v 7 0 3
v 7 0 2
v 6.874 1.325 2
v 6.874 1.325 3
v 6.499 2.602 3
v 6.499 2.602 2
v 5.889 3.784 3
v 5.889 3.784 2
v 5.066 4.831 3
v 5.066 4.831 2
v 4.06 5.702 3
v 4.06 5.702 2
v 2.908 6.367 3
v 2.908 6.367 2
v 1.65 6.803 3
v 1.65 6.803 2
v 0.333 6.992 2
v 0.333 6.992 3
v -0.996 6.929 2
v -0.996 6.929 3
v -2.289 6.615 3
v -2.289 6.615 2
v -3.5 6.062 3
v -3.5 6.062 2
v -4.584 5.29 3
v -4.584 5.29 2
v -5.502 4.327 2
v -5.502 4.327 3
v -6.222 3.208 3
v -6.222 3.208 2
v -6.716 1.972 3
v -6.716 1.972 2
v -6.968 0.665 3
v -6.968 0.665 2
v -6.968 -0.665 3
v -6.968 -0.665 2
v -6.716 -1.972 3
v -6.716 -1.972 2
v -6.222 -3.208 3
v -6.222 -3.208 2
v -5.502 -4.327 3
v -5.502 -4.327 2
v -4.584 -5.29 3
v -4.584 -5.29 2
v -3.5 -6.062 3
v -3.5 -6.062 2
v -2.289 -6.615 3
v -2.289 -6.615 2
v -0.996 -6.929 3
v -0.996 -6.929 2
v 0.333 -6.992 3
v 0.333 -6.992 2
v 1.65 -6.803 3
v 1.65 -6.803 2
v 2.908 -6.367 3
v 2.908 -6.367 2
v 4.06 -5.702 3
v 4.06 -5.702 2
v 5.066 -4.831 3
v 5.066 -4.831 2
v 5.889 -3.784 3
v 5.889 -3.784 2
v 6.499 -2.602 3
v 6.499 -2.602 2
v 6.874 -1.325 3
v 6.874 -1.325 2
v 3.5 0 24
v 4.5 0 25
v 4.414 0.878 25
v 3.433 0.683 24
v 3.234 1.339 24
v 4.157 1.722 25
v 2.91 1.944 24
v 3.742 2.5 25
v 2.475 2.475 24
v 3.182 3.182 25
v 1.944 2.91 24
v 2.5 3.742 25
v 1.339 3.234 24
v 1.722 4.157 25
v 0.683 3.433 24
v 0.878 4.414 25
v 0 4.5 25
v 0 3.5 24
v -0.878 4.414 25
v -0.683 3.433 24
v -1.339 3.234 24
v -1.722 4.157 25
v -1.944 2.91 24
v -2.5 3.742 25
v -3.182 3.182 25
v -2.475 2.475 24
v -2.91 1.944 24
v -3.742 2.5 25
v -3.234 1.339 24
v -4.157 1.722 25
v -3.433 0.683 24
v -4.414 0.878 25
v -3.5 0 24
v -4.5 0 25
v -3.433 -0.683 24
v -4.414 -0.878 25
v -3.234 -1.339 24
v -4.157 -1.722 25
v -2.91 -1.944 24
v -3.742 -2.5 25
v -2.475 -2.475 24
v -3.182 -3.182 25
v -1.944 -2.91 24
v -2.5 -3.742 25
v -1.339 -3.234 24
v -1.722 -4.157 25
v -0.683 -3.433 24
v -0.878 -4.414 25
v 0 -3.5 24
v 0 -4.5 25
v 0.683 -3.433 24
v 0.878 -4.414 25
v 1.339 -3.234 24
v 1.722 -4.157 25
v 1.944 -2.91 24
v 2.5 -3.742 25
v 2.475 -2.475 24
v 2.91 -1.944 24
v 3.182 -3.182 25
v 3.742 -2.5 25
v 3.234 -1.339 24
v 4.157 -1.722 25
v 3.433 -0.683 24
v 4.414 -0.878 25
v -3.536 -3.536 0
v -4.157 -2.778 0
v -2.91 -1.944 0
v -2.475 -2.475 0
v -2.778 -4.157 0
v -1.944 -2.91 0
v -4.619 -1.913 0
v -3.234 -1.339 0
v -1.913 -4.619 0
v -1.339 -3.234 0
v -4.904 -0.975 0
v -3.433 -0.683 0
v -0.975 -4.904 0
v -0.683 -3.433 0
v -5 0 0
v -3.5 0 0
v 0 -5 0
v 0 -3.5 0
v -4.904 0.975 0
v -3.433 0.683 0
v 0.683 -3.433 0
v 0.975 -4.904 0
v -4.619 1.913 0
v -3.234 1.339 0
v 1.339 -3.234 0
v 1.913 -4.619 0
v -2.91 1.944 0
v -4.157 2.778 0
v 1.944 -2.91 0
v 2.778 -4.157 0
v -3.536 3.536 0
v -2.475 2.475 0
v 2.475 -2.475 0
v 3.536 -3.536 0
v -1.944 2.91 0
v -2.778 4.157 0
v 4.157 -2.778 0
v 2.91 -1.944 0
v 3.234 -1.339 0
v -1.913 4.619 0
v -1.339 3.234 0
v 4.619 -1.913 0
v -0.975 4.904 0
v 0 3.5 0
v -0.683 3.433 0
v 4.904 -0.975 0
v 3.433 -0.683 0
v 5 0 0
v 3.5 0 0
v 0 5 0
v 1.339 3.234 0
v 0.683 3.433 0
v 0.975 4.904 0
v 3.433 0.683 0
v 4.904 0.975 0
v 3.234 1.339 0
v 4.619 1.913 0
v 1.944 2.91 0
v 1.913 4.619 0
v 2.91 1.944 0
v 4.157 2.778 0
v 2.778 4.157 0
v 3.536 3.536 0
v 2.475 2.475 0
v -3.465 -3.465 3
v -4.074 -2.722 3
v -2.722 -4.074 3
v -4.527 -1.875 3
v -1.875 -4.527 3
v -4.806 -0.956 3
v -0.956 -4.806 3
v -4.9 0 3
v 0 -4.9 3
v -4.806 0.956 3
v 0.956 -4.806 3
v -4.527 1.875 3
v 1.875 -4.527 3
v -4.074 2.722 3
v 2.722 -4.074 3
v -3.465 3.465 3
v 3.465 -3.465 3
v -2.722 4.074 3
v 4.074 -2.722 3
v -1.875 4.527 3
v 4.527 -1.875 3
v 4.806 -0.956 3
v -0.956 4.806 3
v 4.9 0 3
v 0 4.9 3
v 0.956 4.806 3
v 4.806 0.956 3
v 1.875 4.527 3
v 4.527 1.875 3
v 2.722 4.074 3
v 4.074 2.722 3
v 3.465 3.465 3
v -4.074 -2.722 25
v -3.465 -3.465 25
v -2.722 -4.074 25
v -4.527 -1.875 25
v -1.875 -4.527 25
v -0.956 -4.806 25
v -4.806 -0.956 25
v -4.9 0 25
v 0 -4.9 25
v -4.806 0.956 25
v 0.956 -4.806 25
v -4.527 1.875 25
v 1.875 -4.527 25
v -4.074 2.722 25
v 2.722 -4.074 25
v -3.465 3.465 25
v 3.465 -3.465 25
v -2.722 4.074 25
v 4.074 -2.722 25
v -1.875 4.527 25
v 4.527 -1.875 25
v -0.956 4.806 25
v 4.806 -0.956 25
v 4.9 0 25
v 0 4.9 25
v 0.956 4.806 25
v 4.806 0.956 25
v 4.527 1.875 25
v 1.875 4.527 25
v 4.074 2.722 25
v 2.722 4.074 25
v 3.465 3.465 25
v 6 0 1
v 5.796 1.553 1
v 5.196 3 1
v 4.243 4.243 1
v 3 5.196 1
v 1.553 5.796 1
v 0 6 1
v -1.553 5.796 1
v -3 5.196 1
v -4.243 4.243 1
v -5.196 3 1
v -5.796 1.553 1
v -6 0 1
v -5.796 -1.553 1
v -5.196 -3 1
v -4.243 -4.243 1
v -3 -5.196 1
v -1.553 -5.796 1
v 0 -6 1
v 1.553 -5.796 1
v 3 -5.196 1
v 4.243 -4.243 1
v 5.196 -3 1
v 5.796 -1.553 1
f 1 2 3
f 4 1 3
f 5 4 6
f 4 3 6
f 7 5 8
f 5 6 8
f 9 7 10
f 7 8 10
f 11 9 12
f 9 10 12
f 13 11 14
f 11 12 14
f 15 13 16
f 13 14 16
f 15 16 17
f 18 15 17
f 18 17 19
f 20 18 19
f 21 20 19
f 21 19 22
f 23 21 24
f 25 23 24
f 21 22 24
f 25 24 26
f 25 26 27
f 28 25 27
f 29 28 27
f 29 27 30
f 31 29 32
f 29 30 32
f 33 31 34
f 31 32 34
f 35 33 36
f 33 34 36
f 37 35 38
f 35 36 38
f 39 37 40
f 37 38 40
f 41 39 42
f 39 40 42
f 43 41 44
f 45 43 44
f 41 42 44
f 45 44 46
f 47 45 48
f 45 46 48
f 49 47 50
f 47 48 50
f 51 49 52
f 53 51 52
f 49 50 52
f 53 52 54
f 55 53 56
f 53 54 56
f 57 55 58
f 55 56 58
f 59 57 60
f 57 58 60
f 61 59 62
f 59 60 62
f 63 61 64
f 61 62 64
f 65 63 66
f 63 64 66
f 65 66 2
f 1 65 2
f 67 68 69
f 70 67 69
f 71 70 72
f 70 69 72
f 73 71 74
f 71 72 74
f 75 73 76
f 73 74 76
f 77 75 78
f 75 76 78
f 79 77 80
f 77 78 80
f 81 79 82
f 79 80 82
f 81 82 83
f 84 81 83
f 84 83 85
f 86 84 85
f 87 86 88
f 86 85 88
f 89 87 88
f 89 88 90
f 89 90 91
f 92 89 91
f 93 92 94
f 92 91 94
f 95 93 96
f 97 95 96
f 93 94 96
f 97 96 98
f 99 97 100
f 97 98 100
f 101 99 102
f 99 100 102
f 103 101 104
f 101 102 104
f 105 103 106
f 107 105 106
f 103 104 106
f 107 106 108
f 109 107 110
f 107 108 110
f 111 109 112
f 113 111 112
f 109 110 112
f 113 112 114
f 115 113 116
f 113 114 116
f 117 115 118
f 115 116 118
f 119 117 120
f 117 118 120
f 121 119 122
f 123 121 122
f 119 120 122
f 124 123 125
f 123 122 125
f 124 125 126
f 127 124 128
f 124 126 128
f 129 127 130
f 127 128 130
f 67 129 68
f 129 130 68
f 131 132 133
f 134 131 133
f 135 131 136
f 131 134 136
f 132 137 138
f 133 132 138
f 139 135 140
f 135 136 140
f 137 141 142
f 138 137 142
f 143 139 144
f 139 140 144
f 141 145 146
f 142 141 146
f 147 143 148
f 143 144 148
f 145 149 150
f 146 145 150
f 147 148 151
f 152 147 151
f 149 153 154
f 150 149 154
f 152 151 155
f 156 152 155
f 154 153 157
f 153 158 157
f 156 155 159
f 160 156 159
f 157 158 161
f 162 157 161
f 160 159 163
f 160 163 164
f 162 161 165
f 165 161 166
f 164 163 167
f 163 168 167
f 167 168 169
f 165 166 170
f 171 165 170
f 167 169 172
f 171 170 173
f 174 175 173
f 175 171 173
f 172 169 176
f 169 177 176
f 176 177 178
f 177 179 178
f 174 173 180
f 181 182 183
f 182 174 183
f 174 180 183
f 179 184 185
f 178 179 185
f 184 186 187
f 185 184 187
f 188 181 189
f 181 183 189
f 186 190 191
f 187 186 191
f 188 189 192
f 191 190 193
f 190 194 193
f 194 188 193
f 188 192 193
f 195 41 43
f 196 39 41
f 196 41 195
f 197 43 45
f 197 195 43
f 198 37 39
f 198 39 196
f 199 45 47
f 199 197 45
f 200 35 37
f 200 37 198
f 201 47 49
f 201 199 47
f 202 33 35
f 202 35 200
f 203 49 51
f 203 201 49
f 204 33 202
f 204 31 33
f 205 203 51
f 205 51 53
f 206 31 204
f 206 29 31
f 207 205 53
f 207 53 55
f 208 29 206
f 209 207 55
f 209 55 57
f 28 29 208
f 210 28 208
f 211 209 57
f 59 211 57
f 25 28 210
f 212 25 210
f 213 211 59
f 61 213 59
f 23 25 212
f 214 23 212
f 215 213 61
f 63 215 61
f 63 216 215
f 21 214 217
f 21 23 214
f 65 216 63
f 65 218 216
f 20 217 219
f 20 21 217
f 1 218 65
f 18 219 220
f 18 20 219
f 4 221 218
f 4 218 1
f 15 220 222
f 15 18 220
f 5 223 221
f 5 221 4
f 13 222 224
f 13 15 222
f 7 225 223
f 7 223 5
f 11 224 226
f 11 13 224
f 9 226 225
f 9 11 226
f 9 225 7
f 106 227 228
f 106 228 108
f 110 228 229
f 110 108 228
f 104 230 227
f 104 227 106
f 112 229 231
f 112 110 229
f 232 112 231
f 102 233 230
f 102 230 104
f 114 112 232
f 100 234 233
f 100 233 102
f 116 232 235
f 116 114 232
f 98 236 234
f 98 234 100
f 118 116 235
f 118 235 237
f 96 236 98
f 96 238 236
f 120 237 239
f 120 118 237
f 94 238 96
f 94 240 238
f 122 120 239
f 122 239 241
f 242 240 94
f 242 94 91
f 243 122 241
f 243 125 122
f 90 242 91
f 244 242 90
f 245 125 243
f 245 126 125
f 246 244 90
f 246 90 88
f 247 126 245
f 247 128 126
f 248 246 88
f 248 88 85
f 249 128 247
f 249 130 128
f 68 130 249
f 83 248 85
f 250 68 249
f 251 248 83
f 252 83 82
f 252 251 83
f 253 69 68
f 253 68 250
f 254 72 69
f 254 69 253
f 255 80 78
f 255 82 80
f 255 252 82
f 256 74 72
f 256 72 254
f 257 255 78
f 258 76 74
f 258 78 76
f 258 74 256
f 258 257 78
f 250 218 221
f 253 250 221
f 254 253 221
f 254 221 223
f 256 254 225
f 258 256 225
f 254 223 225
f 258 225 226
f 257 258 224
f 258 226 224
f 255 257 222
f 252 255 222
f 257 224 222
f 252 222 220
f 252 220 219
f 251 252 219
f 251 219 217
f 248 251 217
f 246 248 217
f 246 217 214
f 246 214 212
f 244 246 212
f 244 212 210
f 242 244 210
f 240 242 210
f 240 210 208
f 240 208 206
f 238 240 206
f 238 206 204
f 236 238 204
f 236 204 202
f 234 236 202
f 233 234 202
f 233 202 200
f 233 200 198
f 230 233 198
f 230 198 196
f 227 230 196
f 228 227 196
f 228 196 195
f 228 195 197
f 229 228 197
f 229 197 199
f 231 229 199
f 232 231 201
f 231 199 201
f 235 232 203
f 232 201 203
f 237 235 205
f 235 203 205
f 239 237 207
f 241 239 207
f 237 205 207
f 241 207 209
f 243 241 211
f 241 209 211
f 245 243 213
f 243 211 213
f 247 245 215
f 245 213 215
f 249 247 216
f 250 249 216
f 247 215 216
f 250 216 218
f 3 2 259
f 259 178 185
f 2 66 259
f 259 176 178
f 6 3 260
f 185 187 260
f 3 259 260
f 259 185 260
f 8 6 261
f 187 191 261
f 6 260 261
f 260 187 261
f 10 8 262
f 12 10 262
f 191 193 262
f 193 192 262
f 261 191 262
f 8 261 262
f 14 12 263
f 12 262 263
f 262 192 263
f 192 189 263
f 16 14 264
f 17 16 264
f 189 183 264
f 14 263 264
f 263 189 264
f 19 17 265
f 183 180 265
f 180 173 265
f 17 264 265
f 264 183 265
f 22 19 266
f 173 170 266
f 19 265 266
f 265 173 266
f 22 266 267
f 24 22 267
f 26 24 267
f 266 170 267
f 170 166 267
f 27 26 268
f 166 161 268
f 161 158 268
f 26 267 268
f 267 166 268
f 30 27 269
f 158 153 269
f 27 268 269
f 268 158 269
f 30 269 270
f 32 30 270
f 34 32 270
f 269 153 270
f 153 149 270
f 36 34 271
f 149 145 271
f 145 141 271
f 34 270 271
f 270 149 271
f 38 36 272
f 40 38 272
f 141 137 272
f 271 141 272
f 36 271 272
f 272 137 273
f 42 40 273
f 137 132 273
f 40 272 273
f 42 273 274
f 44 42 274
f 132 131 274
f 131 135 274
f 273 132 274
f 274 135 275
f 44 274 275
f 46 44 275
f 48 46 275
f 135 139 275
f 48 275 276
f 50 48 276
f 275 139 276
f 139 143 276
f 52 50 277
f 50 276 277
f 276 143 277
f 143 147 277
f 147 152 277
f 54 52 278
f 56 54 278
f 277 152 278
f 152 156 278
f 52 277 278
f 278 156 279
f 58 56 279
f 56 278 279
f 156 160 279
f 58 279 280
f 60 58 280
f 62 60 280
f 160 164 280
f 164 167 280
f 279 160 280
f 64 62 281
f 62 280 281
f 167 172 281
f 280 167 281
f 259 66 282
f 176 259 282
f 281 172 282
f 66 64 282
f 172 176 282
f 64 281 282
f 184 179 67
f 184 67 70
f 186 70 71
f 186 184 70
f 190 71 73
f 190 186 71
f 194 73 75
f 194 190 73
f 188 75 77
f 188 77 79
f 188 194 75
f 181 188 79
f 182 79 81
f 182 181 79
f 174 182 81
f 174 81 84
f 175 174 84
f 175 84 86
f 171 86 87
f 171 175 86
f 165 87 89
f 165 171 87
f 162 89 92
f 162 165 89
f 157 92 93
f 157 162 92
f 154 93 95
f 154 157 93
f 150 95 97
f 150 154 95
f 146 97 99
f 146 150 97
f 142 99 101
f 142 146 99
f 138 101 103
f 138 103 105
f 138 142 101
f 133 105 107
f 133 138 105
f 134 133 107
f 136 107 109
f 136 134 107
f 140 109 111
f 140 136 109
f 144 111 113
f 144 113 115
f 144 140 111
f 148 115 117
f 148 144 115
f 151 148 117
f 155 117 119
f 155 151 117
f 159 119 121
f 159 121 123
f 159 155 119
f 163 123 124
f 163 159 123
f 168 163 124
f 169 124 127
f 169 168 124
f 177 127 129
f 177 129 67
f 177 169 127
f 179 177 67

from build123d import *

# Parameters (mm, degrees)
F0_R     = 4.9
F0_R_2   = 3.5
F1_DEPTH = 25
F0_R_3   = 7
F2_DEPTH = 3
F3_SIZE  = 2
F4_SIZE  = 1


with BuildPart() as f1:
    # F0 (on Top) → F1 (new body)
    with BuildSketch(Plane.XY):
        Circle(F0_R)
        Circle(F0_R_2, mode=Mode.SUBTRACT)
    extrude(amount=F1_DEPTH)

    # F0 (on Top) → F2 (join)
    with BuildSketch(Plane.XY):
        Circle(F0_R_3)
        Circle(F0_R, mode=Mode.SUBTRACT)
    extrude(amount=F2_DEPTH)

    # F3
    f3_edges = [f1.edges().sort_by_distance(p)[0] for p in [
        (-7, 0, 0),
    ]]
    chamfer(f3_edges, length=F3_SIZE)

    # F4
    f4_edges = [f1.edges().sort_by_distance(p)[0] for p in [
        (-3.5, 0, 25),
    ]]
    chamfer(f4_edges, length=F4_SIZE)


solid = f1.part
